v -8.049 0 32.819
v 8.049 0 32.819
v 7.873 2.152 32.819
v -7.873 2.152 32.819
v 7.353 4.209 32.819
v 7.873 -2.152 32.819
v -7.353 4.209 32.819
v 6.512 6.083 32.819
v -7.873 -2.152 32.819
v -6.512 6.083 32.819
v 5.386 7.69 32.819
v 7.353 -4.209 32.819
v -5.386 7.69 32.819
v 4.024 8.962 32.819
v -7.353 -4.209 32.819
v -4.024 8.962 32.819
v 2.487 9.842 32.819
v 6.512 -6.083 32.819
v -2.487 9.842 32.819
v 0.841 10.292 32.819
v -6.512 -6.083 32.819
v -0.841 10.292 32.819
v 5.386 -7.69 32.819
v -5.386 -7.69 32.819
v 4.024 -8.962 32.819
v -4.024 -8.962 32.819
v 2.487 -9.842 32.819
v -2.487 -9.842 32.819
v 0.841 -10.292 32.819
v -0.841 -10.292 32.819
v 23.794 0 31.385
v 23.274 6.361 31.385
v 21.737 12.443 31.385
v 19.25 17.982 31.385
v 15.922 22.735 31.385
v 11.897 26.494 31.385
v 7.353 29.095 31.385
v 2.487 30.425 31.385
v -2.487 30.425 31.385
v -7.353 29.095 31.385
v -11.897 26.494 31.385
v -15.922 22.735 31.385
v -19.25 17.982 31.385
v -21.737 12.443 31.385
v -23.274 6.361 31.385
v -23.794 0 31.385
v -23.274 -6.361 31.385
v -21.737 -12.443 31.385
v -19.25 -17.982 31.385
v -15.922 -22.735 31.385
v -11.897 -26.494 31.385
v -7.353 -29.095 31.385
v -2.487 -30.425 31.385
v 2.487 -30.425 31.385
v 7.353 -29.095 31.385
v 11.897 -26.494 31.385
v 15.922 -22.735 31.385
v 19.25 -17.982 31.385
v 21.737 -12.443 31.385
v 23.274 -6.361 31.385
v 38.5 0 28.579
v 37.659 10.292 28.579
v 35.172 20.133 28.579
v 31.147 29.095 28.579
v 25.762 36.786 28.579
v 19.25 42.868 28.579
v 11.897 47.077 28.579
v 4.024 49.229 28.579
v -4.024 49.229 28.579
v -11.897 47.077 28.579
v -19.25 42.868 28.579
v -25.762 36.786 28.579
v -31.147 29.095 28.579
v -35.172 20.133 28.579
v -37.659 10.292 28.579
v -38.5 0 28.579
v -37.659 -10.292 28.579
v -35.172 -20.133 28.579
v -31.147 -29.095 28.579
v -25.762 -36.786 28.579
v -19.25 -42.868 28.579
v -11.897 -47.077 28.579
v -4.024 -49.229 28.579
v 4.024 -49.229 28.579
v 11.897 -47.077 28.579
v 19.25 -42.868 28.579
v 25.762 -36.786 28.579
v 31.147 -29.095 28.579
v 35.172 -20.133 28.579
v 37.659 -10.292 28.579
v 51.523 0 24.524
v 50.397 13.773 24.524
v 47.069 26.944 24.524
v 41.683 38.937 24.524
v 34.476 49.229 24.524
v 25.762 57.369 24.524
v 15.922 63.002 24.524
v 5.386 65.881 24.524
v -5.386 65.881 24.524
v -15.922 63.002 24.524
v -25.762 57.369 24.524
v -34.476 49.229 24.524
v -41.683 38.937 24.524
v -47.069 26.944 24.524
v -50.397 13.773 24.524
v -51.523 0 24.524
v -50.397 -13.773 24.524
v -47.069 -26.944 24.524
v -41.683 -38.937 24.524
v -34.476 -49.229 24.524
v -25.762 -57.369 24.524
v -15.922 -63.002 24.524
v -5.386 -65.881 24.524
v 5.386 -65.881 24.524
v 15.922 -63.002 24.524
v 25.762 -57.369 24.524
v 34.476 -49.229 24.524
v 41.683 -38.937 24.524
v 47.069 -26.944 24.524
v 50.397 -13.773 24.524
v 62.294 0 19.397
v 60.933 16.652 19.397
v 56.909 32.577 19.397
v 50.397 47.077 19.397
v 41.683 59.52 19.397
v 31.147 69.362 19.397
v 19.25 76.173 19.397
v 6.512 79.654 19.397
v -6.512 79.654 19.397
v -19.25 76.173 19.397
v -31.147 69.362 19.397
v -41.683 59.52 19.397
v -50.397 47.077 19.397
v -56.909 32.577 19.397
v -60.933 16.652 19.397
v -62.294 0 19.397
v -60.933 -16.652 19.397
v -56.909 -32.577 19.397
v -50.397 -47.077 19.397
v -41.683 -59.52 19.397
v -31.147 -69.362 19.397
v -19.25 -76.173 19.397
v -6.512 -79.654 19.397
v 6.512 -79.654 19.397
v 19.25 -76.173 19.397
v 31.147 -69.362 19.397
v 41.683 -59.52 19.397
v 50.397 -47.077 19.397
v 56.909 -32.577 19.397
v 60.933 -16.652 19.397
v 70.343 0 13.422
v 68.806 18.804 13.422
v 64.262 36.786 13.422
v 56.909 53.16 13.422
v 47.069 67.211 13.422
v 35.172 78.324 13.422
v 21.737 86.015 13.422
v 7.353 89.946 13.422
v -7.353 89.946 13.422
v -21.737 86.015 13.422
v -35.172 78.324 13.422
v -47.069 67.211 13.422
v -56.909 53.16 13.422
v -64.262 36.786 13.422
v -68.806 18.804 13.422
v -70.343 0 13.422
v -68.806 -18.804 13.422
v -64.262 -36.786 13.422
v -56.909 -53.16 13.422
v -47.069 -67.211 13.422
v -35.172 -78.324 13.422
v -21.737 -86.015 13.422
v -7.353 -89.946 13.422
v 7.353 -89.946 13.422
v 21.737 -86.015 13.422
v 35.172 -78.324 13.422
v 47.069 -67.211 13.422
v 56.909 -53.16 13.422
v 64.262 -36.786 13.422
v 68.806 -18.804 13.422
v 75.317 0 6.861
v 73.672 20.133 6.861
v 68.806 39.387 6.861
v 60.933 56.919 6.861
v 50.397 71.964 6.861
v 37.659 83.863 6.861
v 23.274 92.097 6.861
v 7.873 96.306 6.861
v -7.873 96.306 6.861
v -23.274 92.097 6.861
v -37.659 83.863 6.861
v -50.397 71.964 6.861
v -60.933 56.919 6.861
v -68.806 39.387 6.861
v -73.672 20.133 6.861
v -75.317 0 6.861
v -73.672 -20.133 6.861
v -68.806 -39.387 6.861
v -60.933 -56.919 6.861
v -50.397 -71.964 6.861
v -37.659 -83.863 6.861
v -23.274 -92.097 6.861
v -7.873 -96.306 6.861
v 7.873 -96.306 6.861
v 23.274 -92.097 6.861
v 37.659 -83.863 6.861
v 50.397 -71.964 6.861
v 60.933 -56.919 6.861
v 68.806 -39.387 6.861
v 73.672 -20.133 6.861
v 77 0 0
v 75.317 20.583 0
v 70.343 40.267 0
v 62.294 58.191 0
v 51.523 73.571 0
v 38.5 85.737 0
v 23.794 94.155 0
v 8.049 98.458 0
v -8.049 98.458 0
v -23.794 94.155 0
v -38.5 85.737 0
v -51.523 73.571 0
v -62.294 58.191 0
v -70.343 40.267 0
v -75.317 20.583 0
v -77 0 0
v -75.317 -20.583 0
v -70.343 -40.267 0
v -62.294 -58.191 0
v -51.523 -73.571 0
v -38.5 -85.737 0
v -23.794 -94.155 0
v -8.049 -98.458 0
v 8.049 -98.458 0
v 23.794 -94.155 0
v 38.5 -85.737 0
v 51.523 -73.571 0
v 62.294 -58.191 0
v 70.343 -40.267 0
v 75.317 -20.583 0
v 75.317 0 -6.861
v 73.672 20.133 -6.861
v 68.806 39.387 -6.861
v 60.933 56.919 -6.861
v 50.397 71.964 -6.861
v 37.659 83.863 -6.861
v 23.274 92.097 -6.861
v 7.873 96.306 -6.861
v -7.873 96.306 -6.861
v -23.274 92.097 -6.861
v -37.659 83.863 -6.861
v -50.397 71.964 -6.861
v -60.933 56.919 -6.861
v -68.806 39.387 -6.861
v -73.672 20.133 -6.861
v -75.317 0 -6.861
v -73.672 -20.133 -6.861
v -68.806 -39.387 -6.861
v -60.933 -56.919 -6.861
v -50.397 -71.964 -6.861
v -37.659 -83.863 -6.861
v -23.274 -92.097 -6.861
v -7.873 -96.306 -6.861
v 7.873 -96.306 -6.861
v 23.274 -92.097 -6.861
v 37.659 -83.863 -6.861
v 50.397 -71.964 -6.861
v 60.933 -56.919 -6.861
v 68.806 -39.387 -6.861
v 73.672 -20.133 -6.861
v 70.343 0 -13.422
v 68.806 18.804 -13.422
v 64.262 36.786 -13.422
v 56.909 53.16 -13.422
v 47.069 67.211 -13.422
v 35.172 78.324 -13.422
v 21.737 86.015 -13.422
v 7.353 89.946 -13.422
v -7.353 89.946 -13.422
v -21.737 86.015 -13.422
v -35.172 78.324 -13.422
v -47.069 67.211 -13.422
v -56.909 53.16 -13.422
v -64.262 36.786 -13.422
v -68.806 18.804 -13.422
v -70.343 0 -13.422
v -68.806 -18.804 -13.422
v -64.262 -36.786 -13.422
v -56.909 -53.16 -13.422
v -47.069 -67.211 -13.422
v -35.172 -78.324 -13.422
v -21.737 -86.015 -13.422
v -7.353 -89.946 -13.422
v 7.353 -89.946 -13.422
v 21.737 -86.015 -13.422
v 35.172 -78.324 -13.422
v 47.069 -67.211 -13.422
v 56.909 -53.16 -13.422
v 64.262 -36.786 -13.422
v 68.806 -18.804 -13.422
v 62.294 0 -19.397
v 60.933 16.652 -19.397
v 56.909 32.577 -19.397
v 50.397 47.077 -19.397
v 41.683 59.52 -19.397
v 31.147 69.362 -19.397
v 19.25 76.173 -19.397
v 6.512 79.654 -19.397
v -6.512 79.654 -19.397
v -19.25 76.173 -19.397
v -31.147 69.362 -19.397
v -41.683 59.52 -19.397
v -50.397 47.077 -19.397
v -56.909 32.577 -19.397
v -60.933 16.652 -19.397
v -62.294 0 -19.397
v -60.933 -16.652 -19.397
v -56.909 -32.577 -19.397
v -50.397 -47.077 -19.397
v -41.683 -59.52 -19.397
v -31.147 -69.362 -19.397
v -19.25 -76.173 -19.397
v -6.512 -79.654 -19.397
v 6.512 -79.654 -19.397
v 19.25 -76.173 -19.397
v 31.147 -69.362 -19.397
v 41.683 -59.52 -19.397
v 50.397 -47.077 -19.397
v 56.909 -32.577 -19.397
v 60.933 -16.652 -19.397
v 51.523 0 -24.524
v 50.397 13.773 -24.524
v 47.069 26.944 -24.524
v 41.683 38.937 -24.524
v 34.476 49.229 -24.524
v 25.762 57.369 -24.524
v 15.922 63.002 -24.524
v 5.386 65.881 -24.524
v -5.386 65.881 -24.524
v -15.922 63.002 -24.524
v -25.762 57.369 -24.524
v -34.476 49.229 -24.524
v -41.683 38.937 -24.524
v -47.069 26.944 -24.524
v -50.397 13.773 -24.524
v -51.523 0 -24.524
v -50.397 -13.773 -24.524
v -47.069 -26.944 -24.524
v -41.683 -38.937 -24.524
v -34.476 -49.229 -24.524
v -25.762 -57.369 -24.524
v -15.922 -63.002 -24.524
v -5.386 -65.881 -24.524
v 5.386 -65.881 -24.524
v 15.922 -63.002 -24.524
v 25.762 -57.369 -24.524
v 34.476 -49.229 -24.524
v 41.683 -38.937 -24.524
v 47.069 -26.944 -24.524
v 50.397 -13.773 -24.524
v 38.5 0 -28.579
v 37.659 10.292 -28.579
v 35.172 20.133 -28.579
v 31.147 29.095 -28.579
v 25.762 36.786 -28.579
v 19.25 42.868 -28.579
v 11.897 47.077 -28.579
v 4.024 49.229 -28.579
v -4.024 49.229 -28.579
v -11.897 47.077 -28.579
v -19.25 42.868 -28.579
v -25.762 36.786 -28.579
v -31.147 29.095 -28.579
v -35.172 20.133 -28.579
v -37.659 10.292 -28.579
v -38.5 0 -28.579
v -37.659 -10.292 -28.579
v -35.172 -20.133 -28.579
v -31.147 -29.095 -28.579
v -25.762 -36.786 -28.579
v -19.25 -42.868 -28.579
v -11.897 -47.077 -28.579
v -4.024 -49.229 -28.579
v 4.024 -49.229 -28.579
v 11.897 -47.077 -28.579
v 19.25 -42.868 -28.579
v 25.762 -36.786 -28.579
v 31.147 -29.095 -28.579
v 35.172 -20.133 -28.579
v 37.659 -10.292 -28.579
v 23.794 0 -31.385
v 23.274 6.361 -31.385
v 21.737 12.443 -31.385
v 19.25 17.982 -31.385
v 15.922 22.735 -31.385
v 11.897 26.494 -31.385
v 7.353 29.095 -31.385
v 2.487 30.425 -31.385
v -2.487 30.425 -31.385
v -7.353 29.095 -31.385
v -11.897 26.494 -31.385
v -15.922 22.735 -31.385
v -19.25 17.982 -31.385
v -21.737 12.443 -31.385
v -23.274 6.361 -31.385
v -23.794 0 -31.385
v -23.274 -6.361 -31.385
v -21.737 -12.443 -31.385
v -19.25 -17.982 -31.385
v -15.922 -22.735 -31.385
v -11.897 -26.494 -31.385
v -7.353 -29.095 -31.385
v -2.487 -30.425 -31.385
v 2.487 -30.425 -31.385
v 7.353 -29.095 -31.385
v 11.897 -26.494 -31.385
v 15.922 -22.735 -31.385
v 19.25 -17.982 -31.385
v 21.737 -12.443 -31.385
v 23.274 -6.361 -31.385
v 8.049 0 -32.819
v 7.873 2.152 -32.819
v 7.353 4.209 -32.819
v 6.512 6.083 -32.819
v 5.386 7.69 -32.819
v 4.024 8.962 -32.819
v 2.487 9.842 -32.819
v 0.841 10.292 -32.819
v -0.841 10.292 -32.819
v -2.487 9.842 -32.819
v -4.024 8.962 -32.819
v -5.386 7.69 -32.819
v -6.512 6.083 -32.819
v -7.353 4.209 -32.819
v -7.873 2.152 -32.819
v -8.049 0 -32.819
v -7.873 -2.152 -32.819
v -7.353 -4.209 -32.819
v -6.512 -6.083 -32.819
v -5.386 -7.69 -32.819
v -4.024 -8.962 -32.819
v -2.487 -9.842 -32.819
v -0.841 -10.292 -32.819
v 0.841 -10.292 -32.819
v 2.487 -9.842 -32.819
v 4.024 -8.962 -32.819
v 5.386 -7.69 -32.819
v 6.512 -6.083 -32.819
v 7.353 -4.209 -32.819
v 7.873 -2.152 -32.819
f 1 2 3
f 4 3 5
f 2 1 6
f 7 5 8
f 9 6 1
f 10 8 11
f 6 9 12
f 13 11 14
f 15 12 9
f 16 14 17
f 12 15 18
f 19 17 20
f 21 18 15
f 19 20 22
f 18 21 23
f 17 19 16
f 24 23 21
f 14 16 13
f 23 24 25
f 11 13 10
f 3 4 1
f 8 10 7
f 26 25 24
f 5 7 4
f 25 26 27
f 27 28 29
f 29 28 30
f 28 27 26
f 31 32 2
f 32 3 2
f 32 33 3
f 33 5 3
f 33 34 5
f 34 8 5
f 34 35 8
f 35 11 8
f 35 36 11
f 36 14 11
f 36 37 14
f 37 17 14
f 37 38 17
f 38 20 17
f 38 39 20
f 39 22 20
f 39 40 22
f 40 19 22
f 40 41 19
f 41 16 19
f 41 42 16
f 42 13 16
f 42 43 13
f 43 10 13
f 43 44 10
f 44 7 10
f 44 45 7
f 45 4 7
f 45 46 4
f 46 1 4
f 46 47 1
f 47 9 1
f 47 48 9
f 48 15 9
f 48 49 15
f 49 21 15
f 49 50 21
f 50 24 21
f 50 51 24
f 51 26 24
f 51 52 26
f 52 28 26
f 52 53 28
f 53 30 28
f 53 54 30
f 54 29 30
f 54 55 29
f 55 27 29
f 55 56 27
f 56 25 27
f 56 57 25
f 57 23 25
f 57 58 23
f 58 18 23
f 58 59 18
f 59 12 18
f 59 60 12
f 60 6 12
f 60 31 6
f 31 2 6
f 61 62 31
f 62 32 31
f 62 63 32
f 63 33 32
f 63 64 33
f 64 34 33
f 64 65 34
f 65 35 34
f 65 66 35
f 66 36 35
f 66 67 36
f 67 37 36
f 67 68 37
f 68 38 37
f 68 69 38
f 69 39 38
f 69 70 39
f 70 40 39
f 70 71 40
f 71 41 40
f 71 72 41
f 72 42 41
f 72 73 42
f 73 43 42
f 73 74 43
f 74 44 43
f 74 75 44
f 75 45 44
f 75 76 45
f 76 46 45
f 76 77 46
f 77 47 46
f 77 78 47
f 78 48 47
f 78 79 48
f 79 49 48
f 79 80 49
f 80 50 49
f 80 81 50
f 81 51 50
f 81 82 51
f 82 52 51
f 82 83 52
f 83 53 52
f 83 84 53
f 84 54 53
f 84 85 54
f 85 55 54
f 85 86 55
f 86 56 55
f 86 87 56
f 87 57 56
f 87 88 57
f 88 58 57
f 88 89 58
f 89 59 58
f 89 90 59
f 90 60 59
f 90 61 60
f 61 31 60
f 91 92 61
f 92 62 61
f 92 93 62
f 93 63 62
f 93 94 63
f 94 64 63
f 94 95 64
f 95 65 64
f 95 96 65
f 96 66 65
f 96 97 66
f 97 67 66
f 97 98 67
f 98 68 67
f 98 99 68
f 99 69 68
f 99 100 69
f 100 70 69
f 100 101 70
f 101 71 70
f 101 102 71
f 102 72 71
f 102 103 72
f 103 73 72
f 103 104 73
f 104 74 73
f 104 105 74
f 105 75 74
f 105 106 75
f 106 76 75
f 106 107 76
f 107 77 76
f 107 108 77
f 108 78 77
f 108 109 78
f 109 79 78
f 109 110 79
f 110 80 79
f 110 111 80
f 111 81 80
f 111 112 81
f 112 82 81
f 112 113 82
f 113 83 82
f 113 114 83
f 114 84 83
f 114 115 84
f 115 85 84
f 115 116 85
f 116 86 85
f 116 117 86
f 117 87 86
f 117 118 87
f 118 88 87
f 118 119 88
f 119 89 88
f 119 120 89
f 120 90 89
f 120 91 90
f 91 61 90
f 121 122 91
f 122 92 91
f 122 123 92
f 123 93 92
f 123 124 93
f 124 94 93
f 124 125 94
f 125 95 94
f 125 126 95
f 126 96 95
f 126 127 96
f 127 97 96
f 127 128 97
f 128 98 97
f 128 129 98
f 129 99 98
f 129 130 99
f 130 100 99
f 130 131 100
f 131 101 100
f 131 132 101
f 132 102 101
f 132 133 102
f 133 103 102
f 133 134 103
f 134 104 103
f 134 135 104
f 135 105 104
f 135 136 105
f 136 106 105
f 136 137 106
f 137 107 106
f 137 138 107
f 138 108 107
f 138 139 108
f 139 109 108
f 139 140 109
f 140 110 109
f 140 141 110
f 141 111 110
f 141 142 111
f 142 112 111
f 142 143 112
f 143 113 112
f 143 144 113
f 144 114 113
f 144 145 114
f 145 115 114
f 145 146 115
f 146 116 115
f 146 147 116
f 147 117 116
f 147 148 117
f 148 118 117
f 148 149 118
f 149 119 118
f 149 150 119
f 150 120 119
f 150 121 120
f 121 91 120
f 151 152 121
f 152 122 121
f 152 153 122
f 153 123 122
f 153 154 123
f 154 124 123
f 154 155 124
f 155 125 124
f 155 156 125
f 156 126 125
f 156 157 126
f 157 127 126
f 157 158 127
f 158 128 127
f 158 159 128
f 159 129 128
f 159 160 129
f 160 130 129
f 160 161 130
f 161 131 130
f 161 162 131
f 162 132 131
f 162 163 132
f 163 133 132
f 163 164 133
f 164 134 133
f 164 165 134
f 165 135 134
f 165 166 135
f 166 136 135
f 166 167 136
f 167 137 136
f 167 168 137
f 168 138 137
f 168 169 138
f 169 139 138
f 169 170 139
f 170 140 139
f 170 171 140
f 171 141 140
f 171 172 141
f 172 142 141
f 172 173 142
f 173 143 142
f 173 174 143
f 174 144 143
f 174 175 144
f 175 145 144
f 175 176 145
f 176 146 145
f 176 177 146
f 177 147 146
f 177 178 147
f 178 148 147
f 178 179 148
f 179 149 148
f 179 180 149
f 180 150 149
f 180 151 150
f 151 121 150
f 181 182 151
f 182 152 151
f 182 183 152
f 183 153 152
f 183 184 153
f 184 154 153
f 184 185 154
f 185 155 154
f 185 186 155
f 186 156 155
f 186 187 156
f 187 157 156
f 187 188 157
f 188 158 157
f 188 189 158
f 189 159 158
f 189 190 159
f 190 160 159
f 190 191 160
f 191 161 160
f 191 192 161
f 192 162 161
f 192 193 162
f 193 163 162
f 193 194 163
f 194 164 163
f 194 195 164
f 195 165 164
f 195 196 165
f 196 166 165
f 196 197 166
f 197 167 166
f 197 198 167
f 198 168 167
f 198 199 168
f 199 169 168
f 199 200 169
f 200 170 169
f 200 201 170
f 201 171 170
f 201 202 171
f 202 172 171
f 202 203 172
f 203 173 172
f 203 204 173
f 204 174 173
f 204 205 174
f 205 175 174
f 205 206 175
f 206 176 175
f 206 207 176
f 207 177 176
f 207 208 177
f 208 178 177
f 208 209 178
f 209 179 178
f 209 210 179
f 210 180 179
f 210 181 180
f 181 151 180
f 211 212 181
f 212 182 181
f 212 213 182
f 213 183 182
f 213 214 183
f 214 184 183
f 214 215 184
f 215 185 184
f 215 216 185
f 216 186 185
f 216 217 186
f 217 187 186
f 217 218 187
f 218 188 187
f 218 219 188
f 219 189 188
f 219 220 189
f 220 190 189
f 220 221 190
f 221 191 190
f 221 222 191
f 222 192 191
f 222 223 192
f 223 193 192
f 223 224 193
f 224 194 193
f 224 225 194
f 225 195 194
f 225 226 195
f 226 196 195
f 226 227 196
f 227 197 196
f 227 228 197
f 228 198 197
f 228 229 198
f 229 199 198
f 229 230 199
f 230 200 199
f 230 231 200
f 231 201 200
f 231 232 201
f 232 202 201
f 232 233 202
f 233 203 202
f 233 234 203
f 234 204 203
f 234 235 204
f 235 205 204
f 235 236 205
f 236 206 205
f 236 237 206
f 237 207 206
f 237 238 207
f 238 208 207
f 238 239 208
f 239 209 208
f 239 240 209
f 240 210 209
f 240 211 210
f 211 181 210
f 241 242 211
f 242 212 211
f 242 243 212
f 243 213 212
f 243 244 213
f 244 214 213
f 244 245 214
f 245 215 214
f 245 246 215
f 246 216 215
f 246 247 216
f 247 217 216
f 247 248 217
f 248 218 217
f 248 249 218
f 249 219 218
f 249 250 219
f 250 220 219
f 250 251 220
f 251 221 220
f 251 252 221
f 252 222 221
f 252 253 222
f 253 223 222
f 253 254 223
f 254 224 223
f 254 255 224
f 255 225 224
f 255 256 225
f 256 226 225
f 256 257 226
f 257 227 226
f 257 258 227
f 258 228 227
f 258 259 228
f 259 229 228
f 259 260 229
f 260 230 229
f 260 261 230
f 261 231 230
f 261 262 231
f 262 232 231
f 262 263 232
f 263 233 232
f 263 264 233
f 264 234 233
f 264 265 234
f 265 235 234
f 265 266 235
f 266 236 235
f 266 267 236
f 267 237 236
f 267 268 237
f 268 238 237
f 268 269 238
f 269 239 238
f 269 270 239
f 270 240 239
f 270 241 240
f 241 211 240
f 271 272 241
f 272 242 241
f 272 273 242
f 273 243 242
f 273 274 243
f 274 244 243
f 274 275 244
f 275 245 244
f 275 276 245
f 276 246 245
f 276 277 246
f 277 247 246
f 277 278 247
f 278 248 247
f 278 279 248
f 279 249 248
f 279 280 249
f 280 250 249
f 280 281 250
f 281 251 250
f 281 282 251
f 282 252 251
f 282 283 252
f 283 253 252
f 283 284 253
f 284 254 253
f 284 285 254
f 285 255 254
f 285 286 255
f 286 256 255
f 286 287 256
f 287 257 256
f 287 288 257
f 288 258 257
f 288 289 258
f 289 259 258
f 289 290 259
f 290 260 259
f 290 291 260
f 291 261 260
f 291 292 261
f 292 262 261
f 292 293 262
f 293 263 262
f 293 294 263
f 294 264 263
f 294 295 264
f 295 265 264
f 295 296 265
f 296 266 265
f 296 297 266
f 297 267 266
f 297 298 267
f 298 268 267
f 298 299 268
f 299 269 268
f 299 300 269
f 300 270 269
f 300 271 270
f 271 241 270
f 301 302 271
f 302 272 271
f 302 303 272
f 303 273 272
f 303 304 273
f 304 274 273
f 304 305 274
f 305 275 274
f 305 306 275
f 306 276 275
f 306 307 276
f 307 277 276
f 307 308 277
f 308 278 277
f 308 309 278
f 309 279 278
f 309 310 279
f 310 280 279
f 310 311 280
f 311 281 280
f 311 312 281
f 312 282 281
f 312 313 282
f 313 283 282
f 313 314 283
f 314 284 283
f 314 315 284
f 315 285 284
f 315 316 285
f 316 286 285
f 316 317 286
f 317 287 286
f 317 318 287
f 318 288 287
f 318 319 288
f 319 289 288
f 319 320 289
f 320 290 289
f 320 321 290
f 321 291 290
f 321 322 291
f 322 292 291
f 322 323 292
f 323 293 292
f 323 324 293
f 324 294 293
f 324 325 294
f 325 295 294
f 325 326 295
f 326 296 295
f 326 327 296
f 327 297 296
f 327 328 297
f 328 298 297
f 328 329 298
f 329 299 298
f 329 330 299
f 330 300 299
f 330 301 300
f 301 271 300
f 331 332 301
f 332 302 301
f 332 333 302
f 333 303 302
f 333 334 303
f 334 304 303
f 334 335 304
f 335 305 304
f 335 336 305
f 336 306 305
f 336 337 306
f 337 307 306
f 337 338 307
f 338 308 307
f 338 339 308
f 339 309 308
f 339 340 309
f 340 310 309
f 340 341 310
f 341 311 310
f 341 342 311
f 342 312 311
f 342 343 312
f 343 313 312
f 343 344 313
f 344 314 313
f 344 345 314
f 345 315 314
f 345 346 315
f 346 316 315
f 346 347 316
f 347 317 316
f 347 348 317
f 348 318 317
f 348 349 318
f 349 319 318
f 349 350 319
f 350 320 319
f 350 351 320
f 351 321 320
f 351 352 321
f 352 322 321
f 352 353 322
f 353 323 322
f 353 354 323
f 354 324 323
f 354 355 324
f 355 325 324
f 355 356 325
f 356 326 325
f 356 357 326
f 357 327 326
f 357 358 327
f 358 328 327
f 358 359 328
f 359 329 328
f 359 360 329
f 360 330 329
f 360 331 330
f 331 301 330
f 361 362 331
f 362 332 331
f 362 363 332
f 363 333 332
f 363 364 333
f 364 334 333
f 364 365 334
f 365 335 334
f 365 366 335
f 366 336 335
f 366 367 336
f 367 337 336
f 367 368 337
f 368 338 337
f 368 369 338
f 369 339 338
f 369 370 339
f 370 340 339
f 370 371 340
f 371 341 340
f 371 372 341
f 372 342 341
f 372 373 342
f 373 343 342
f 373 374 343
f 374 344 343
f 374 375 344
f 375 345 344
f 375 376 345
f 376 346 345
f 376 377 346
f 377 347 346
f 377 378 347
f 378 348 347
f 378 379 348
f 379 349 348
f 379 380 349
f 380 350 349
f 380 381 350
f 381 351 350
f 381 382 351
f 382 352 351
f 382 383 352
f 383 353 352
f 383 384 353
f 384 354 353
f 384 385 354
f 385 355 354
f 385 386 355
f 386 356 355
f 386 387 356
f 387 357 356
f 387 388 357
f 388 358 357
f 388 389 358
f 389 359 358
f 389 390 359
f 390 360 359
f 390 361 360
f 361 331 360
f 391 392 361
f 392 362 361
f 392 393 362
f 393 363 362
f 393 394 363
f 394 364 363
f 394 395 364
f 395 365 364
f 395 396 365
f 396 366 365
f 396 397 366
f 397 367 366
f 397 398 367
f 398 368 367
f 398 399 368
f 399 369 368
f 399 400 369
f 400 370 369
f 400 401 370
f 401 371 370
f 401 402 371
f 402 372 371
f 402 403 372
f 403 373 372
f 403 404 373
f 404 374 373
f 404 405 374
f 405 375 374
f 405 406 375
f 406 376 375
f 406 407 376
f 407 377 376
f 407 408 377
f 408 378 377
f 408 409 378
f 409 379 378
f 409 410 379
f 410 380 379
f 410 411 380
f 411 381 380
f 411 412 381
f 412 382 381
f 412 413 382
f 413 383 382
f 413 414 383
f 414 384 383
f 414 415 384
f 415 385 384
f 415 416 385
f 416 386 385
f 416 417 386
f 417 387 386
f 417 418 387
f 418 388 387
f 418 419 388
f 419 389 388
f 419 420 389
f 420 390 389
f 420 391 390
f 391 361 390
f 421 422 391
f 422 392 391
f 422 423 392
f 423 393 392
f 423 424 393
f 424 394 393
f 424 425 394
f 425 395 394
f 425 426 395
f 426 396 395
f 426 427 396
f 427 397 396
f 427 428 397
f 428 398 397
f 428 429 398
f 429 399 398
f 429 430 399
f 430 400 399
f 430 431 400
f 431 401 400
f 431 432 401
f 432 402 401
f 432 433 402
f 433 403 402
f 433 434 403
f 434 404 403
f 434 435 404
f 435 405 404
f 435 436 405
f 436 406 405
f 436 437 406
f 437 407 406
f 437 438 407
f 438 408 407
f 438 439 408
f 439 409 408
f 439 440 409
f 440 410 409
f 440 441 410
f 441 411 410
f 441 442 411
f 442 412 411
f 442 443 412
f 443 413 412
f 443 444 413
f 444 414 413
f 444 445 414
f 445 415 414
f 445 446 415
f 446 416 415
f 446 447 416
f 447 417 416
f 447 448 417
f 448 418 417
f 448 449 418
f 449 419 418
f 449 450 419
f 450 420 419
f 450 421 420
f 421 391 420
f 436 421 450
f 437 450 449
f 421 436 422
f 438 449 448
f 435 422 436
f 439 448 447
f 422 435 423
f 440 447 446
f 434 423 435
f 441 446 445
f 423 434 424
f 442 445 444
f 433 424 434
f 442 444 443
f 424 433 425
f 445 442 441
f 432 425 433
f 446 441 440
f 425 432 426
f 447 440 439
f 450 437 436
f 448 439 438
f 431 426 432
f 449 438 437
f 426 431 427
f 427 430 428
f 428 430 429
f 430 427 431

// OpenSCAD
// Generated by SolidPython 1.0.1 on 2020-07-29 00:46:47


scale(v = [7, 9, 3]) {
	sphere(r = 11);
}
/***********************************************
*********      SolidPython code:      **********
************************************************
 
# import packages: SolidPython
from solid import *
from solid.utils import *
from itertools import chain, combinations, permutations


class Resize:

    def __init__(self, scad_file):
        self.scad_file = scad_file
        #self.scad_file = import_scad(scad_file)
        # cone/cylinder param:
        self.r1 = 0
        self.r2 = 0
        self.h = 0
        # rectangular prism param:
        self.w = 0
        self.l = 0
        # ellipse param:
        self.r = 0

    # import OpenScad code (file name corresponds to shape)


    # classify shape + parameters
    def assign(self, param1, param2, param3):
        if self.scad_file == 'cone.scad':
            self.r1 = param1
            self.r2 = param2
            self.h = param3
        elif self.scad_file == 'cylinder.scad':
            self.r1 = param1
            self.r2 = param2
            self.h = param3
        elif self.scad_file == 'rectangularPrism.scad':
            self.h = param1
            self.l = param2
            self.w = param3
        else:
            self.r = param1
            self.h = param2

    # resize parameters
    def iterate(self):
        x = range(3, 20, 2)
        i = 1
        if self.scad_file == 'cone.scad':
            tempList = list(permutations(x, 2))
            for temp in tempList:
                param1 = temp[0]
                param2 = temp[1]
                filepath = 'produced_scad_files/' + 'cone' + str(param1) + '_' + str(param2) + '_' + '.scad'
                scad_render_to_file(cylinder(h=param1, r1=param2, r2=0), filepath)

        elif self.scad_file == 'cylinder.scad':
            tempList = list(permutations(x, 3))
            for temp in tempList:
                param1 = temp[0]
                param2 = temp[1]
                filepath = 'produced_scad_files/' + 'cylinder' + str(param1) + '_' + str(param2) + '_' + '.scad'
                scad_render_to_file(cylinder(h=param1, r1=param2, r2=param2), filepath)

        elif self.scad_file == 'rectangularPrism.scad':
            tempList = list(permutations(x, 3))
            for temp in tempList:
                param1 = temp[0]
                param2 = temp[1]
                param3 = temp[2]
                filepath = 'produced_scad_files/' + 'rectangularPrism' + str(param1) + '_' + str(param2) + '_' + str(
                    param3) + '.scad'
                scad_render_to_file(cube(size=(param1, param2, param3)), filepath)

        elif self.scad_file == 'ellipse.scad':
            tempList = list(permutations(x, 4))
            for temp in tempList:
                param1 = temp[0]
                param2 = temp[1]
                param3 = temp[2]
                param4 = temp[3]
                filepath = 'produced_scad_files/' + 'ellipse' + str(param1) + '_' + str(param2) + '_' + str(param3) + '_' + str(param4) + '.scad'
                scad_render_to_file(scale([param1, param2, param3])(sphere(r=param4)), filepath)

    def render_to_scadfile(self):
        scad_render_to_file(scad, 'example.scad') 
 
************************************************/
